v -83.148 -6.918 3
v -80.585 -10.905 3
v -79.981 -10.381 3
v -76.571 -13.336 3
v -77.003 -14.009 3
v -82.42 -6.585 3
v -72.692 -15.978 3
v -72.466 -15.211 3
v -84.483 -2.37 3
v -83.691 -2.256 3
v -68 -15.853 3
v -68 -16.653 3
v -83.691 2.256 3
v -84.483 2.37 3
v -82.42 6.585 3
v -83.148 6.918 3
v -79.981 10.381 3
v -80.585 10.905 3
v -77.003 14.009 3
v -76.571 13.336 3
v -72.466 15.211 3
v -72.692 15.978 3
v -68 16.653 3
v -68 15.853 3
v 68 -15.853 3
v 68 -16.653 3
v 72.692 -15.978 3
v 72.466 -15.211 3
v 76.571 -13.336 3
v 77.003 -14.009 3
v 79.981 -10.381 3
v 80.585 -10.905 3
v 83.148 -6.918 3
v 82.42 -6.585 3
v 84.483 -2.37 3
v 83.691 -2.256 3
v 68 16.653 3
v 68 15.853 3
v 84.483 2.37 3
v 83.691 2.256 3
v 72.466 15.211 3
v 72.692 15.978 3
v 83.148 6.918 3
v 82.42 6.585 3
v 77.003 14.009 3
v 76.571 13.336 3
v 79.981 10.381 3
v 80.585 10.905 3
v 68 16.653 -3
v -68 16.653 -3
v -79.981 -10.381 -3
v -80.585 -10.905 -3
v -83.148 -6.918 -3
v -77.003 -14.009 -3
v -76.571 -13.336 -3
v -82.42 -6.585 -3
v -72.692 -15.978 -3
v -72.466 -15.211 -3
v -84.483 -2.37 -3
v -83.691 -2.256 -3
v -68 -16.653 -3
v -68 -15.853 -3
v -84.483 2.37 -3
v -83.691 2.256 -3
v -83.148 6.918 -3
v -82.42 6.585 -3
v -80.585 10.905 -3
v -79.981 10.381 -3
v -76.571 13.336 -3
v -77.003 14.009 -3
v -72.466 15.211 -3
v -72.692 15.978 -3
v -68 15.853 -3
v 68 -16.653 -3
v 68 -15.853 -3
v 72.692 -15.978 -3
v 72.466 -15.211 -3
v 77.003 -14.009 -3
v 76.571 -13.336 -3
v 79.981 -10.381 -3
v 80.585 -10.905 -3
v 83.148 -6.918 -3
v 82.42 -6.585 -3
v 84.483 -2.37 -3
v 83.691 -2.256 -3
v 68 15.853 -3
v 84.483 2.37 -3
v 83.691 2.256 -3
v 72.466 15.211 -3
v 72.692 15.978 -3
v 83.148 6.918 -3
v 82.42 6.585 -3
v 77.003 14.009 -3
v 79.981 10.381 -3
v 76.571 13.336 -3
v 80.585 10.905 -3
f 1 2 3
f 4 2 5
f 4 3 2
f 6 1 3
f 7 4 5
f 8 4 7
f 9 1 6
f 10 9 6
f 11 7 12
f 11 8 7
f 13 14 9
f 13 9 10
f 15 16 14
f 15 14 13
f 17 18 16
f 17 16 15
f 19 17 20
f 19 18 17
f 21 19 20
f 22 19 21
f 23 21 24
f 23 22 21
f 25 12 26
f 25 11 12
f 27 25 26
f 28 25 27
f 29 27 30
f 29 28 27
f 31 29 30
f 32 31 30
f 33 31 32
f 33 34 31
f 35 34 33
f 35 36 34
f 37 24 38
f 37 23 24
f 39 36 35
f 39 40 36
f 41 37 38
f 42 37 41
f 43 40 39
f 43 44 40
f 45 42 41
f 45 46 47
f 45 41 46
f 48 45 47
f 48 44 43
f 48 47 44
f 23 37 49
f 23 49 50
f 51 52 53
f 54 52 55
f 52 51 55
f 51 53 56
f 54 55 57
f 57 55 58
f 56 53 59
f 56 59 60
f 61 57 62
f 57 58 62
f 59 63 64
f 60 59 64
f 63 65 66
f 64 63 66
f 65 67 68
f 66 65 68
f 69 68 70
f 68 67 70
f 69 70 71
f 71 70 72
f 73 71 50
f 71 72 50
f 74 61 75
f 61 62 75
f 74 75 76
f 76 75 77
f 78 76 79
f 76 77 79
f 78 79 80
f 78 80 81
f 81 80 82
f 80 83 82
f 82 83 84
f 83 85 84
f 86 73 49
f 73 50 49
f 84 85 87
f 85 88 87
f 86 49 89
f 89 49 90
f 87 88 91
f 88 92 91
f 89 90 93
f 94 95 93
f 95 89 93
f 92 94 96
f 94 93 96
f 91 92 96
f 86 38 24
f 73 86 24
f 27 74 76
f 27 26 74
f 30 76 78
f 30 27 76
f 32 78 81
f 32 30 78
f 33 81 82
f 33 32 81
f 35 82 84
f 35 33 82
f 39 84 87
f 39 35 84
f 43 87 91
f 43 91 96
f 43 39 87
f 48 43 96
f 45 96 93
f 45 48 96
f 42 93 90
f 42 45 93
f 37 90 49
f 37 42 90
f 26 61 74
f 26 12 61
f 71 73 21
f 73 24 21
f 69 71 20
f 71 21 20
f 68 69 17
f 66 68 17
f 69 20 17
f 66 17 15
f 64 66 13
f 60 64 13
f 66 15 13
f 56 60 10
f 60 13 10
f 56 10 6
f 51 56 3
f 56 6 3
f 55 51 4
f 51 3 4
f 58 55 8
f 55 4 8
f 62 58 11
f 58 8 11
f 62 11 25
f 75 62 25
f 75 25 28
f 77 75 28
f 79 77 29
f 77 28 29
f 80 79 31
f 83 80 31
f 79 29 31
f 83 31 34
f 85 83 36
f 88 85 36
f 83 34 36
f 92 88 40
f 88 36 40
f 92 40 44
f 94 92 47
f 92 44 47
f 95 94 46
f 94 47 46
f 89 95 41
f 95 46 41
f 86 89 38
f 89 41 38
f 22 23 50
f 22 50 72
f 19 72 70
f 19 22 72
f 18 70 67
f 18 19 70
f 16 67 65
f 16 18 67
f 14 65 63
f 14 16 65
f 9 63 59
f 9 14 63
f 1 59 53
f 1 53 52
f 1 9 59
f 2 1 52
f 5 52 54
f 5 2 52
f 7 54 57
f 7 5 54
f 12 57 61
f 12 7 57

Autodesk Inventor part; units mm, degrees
ref_plane "YZ Plane" through (0, 0, 0) normal (1, 0, 0) x (0, 1, 0)
ref_plane "XZ Plane" through (0, 0, 0) normal (0, 1, 0) x (-1, 0, 0)
ref_plane "XY Plane" through (0, 0, 0) normal (0, 0, 1) x (1, 0, 0)
sketch "スケッチ1" plane through (0, 0, 0) normal (0, 0, 1) x (1, 0, 0)
  line L0 (-68, 0) -> (68, 0) construction
  line L1 (-68, -16.2338) -> (68, -16.2338)
  line L2 (68, 16.2338) -> (-68, 16.2338)
  arc A0 (-68, 16.2338) -> (-68, -16.2338) centre (-68, 0) ccw
  arc A1 (68, -16.2338) -> (68, 16.2338) centre (68, 0) ccw
  line L3 (-68, -16.6528) -> (68, -16.6528)
  arc A2 (68, -16.6528) -> (68, 16.6528) centre (68, 0) ccw
  line L4 (68, 16.6528) -> (-68, 16.6528)
  arc A3 (-68, 16.6528) -> (-68, -16.6528) centre (-68, 0) ccw
  line L5 (-68, -15.8528) -> (68, -15.8528)
  arc A4 (68, -15.8528) -> (68, 15.8528) centre (68, 0) ccw
  line L6 (68, 15.8528) -> (-68, 15.8528)
  arc A5 (-68, 15.8528) -> (-68, -15.8528) centre (-68, 0) ccw
  point P0 (0, 0)
  dimension "d0" = 136
  dimension "d1" = 16.2338
  dimension "d2" = 0.419
  dimension "d3" = 0.8
extrude "押し出し1" add sketch "スケッチ1" along normal mid plane 6 contours A0 L2 A1 L1 | A3 L4 A2 L3
properties part number "belt4" material "ゴム"
